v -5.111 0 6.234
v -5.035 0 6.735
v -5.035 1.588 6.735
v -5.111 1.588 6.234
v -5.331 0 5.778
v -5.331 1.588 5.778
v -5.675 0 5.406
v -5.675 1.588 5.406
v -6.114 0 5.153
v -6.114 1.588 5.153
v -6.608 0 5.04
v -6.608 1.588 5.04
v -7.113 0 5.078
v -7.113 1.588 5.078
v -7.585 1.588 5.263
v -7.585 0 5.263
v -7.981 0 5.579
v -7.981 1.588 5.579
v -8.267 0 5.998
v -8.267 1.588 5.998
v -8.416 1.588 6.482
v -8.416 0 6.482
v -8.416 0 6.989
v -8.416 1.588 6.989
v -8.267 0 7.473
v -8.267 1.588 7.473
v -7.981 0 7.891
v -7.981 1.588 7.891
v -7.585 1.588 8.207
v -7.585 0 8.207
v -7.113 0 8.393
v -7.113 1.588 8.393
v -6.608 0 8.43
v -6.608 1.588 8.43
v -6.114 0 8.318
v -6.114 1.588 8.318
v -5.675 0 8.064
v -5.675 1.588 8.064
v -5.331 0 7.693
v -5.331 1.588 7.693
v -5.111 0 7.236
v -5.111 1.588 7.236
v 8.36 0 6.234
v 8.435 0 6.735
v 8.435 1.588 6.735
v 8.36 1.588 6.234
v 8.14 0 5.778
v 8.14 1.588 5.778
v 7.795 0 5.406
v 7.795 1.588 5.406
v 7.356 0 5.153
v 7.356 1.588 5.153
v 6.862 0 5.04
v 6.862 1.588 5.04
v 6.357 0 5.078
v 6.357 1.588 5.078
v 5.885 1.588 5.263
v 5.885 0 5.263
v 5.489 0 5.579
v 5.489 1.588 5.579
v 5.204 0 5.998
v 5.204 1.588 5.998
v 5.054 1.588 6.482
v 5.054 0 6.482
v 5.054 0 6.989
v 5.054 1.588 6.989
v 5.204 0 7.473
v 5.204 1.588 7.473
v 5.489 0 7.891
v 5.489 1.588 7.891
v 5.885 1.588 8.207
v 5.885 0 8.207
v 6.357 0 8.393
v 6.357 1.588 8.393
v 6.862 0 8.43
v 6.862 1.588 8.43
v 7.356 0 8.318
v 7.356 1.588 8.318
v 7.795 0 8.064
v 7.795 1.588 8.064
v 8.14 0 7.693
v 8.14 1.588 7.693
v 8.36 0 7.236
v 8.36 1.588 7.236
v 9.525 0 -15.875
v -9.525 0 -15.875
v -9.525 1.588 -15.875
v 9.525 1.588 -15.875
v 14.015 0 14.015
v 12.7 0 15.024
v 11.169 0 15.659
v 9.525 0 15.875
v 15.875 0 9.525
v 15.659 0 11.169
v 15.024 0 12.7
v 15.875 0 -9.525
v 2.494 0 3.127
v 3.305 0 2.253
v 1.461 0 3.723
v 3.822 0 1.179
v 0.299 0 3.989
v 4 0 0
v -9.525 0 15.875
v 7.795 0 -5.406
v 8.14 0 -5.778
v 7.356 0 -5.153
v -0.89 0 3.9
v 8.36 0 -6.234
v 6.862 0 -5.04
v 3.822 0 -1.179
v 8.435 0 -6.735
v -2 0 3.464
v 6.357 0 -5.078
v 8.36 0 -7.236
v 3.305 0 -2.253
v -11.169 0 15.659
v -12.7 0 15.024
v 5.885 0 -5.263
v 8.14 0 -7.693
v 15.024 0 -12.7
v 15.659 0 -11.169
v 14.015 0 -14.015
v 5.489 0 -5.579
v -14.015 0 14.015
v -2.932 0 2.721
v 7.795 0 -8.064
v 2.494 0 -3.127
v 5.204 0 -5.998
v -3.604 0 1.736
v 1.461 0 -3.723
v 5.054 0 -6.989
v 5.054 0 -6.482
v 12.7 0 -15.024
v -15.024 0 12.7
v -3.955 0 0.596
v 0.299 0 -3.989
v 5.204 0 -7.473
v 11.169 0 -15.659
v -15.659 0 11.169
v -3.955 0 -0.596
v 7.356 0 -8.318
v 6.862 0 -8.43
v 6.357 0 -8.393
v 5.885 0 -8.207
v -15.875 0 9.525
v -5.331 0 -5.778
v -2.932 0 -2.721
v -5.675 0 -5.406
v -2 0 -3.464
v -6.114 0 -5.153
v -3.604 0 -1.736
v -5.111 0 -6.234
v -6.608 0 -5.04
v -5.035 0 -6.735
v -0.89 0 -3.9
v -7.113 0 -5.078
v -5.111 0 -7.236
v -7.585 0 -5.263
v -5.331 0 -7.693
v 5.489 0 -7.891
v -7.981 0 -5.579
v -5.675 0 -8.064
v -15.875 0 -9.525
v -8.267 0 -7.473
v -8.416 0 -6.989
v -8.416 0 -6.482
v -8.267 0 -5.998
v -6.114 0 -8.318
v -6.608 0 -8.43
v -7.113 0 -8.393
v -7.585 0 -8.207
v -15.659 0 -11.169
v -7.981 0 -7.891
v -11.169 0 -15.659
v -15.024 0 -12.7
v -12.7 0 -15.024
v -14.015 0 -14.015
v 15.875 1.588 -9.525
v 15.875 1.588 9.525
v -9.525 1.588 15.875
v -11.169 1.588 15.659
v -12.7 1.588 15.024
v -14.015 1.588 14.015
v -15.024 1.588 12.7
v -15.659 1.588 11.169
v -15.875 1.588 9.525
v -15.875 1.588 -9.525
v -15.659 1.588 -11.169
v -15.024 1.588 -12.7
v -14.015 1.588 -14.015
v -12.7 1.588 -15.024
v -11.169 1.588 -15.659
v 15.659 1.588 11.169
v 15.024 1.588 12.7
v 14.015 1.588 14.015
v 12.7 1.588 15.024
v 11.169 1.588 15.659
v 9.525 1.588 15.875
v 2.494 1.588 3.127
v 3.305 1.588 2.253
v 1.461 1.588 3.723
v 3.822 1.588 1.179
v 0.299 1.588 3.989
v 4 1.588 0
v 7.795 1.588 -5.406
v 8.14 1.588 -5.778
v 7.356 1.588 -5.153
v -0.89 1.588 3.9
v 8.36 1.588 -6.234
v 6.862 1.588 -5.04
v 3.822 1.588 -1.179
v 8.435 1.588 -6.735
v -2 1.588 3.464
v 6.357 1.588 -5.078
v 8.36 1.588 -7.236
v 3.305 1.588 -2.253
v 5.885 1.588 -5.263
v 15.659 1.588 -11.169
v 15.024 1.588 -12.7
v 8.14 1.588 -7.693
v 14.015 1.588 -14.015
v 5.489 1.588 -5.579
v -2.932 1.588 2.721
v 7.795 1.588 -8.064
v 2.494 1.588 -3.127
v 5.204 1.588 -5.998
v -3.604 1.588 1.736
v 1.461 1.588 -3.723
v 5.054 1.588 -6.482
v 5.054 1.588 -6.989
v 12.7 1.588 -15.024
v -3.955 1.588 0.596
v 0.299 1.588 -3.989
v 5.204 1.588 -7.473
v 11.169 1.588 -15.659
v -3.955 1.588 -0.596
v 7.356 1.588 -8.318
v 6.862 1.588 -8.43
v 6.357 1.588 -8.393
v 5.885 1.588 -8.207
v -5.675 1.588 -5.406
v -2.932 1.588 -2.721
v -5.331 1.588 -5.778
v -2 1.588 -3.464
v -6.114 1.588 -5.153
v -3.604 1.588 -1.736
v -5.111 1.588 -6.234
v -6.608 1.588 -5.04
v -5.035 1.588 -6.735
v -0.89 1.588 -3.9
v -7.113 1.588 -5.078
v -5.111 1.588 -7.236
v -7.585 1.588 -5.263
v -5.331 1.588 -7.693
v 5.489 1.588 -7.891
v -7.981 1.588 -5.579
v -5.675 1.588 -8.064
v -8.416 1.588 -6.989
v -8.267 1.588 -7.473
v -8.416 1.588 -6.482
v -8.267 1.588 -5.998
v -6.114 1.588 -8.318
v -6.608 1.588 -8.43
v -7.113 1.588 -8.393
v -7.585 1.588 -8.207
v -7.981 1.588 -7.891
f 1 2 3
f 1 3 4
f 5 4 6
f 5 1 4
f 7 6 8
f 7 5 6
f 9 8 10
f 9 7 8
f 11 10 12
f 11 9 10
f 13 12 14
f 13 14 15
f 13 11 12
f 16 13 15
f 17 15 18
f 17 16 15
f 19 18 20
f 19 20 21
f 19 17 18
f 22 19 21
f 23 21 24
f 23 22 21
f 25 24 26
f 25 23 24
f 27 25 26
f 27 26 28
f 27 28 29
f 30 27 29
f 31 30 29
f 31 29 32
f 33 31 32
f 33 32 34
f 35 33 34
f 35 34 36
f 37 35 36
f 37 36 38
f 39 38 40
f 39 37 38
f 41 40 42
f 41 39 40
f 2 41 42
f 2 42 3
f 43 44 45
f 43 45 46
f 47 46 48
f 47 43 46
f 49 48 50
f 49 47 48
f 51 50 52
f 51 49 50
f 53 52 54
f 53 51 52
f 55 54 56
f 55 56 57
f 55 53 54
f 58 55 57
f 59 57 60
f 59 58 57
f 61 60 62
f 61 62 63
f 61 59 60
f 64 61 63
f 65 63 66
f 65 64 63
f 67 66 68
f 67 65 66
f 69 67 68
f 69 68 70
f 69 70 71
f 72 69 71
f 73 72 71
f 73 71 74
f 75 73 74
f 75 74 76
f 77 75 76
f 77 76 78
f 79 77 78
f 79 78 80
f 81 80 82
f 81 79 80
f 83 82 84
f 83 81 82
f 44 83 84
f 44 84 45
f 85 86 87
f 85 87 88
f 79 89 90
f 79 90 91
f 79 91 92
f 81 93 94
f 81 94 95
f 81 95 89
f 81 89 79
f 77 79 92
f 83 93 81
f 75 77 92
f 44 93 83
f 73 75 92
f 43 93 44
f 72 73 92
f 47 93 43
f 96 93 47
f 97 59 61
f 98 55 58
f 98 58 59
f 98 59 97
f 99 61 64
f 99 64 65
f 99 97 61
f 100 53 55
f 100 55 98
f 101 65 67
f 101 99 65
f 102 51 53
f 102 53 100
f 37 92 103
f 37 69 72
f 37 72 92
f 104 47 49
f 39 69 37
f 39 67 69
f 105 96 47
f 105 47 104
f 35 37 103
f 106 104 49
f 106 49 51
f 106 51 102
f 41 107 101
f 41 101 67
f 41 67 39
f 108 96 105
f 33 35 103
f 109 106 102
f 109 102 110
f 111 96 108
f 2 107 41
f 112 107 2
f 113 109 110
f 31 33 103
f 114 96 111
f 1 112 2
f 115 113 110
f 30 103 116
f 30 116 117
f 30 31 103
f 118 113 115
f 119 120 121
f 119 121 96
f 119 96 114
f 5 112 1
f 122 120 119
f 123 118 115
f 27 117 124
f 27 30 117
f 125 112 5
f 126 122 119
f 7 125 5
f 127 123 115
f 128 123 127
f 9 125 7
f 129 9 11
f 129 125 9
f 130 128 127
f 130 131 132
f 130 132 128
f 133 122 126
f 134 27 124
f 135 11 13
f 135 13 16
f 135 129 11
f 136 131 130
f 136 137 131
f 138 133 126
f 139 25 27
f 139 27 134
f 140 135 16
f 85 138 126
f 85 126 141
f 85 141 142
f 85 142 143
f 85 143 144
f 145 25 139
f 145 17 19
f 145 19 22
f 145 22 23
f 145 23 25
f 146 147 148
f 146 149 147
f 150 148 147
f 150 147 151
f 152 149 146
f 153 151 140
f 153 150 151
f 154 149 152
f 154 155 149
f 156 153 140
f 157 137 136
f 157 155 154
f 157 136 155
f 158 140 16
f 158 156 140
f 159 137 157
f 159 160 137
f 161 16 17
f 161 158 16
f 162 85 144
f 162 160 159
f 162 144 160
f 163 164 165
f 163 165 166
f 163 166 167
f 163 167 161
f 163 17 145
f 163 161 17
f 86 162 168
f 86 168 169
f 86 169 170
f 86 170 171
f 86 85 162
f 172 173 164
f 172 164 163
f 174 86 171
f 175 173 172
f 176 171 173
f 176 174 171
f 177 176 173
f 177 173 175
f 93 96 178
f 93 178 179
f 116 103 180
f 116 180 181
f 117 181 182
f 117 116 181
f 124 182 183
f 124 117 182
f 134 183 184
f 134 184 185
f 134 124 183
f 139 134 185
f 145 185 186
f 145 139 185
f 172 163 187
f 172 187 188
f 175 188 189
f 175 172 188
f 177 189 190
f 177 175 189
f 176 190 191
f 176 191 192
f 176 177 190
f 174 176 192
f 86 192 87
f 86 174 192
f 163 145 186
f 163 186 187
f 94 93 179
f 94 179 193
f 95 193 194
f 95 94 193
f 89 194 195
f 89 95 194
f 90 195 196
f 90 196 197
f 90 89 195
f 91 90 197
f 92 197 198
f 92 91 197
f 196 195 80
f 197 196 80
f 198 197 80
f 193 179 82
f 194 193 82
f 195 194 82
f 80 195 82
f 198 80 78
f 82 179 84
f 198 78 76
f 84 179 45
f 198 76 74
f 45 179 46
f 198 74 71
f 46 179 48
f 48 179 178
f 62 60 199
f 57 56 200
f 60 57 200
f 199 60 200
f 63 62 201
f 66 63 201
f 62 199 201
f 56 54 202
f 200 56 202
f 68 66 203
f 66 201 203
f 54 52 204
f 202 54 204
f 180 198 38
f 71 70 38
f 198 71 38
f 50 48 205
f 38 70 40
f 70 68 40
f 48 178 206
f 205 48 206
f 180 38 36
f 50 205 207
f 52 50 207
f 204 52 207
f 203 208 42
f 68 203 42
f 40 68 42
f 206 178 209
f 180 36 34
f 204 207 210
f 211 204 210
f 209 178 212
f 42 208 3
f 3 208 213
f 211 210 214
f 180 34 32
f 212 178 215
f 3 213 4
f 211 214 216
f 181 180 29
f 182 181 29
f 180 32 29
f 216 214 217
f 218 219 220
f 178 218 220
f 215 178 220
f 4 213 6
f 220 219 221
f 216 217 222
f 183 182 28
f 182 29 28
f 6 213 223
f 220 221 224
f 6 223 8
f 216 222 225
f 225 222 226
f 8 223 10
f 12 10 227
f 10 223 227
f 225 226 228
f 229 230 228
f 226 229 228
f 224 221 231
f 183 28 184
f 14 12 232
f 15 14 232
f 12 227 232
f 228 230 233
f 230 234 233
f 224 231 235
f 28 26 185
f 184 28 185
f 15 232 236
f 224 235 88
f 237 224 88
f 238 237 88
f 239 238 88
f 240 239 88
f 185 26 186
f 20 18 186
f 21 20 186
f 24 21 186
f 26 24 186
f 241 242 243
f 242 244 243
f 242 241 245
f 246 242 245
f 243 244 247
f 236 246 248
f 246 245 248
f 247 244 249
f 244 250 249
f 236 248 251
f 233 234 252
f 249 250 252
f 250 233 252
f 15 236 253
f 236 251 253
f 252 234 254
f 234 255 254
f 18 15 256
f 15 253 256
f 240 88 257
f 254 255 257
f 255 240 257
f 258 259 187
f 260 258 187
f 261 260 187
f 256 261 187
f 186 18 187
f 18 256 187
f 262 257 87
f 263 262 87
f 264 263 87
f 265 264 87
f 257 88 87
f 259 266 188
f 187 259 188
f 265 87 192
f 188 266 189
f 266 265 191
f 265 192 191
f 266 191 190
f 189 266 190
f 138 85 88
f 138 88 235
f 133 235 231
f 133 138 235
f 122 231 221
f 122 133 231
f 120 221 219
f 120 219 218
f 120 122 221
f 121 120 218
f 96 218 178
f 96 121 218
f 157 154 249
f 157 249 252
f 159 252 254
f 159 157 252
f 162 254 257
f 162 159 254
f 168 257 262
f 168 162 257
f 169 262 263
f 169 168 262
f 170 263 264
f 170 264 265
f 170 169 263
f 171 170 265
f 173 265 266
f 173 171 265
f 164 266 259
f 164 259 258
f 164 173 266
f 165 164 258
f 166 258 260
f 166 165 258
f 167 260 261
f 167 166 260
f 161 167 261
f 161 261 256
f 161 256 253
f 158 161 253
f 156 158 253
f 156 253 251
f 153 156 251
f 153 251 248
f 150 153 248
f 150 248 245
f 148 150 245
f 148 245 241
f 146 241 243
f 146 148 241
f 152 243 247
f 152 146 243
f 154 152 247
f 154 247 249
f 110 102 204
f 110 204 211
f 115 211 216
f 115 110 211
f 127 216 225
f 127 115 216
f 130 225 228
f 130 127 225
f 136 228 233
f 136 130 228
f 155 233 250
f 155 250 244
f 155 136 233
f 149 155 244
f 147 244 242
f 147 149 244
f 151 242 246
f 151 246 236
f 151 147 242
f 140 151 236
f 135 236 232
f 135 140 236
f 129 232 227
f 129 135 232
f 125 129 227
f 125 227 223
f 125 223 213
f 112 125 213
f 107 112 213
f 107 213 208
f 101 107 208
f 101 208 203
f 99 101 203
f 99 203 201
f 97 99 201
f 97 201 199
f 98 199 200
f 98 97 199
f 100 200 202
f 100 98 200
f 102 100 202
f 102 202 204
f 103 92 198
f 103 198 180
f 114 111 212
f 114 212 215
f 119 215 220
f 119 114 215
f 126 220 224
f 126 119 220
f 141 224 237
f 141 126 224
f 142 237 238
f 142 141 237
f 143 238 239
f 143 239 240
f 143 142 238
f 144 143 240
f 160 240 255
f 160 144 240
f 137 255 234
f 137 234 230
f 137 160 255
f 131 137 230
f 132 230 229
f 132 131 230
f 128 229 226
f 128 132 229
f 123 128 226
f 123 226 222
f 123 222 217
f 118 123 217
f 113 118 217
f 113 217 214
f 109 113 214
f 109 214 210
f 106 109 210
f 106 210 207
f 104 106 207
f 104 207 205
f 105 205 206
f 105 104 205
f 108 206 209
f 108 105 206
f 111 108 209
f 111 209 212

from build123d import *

# Parameters (mm, degrees)
SKETCH1_R           = 1.6999966
SKETCH1_R_2         = 4
BOSS_EXTRUDE1_DEPTH = 1.5875


with BuildPart() as part:
    # Sketch1 → Boss-Extrude1 (new body)
    with BuildSketch(Plane(origin=(0, 0, 0), x_dir=(1, 0, 0), z_dir=(0, 1, 0))):
        with BuildLine():
            Line((-9.525, 15.875), (9.525, 15.875))
            ThreePointArc((9.525, 15.875), (14.015128061, 14.015128061), (15.875, 9.525))
            Line((15.875, 9.525), (15.875, -9.525))
            ThreePointArc((15.875, -9.525), (14.015128061, -14.015128061), (9.525, -15.875))
            Line((9.525, -15.875), (-9.525, -15.875))
            ThreePointArc((-9.525, -15.875), (-14.015128061, -14.015128061), (-15.875, -9.525))
            Line((-15.875, -9.525), (-15.875, 9.525))
            ThreePointArc((-15.875, 9.525), (-14.015128061, 14.015128061), (-9.525, 15.875))
        make_face()
        with Locations((-6.735192091, -6.735192091)):
            Circle(SKETCH1_R, mode=Mode.SUBTRACT)
        with Locations((6.735192091, -6.735192091)):
            Circle(SKETCH1_R, mode=Mode.SUBTRACT)
        Circle(SKETCH1_R_2, mode=Mode.SUBTRACT)
        with Locations((6.735192091, 6.735192091)):
            Circle(SKETCH1_R, mode=Mode.SUBTRACT)
        with Locations((-6.735192091, 6.735192091)):
            Circle(SKETCH1_R, mode=Mode.SUBTRACT)
    extrude(amount=BOSS_EXTRUDE1_DEPTH)


solid = part.part
